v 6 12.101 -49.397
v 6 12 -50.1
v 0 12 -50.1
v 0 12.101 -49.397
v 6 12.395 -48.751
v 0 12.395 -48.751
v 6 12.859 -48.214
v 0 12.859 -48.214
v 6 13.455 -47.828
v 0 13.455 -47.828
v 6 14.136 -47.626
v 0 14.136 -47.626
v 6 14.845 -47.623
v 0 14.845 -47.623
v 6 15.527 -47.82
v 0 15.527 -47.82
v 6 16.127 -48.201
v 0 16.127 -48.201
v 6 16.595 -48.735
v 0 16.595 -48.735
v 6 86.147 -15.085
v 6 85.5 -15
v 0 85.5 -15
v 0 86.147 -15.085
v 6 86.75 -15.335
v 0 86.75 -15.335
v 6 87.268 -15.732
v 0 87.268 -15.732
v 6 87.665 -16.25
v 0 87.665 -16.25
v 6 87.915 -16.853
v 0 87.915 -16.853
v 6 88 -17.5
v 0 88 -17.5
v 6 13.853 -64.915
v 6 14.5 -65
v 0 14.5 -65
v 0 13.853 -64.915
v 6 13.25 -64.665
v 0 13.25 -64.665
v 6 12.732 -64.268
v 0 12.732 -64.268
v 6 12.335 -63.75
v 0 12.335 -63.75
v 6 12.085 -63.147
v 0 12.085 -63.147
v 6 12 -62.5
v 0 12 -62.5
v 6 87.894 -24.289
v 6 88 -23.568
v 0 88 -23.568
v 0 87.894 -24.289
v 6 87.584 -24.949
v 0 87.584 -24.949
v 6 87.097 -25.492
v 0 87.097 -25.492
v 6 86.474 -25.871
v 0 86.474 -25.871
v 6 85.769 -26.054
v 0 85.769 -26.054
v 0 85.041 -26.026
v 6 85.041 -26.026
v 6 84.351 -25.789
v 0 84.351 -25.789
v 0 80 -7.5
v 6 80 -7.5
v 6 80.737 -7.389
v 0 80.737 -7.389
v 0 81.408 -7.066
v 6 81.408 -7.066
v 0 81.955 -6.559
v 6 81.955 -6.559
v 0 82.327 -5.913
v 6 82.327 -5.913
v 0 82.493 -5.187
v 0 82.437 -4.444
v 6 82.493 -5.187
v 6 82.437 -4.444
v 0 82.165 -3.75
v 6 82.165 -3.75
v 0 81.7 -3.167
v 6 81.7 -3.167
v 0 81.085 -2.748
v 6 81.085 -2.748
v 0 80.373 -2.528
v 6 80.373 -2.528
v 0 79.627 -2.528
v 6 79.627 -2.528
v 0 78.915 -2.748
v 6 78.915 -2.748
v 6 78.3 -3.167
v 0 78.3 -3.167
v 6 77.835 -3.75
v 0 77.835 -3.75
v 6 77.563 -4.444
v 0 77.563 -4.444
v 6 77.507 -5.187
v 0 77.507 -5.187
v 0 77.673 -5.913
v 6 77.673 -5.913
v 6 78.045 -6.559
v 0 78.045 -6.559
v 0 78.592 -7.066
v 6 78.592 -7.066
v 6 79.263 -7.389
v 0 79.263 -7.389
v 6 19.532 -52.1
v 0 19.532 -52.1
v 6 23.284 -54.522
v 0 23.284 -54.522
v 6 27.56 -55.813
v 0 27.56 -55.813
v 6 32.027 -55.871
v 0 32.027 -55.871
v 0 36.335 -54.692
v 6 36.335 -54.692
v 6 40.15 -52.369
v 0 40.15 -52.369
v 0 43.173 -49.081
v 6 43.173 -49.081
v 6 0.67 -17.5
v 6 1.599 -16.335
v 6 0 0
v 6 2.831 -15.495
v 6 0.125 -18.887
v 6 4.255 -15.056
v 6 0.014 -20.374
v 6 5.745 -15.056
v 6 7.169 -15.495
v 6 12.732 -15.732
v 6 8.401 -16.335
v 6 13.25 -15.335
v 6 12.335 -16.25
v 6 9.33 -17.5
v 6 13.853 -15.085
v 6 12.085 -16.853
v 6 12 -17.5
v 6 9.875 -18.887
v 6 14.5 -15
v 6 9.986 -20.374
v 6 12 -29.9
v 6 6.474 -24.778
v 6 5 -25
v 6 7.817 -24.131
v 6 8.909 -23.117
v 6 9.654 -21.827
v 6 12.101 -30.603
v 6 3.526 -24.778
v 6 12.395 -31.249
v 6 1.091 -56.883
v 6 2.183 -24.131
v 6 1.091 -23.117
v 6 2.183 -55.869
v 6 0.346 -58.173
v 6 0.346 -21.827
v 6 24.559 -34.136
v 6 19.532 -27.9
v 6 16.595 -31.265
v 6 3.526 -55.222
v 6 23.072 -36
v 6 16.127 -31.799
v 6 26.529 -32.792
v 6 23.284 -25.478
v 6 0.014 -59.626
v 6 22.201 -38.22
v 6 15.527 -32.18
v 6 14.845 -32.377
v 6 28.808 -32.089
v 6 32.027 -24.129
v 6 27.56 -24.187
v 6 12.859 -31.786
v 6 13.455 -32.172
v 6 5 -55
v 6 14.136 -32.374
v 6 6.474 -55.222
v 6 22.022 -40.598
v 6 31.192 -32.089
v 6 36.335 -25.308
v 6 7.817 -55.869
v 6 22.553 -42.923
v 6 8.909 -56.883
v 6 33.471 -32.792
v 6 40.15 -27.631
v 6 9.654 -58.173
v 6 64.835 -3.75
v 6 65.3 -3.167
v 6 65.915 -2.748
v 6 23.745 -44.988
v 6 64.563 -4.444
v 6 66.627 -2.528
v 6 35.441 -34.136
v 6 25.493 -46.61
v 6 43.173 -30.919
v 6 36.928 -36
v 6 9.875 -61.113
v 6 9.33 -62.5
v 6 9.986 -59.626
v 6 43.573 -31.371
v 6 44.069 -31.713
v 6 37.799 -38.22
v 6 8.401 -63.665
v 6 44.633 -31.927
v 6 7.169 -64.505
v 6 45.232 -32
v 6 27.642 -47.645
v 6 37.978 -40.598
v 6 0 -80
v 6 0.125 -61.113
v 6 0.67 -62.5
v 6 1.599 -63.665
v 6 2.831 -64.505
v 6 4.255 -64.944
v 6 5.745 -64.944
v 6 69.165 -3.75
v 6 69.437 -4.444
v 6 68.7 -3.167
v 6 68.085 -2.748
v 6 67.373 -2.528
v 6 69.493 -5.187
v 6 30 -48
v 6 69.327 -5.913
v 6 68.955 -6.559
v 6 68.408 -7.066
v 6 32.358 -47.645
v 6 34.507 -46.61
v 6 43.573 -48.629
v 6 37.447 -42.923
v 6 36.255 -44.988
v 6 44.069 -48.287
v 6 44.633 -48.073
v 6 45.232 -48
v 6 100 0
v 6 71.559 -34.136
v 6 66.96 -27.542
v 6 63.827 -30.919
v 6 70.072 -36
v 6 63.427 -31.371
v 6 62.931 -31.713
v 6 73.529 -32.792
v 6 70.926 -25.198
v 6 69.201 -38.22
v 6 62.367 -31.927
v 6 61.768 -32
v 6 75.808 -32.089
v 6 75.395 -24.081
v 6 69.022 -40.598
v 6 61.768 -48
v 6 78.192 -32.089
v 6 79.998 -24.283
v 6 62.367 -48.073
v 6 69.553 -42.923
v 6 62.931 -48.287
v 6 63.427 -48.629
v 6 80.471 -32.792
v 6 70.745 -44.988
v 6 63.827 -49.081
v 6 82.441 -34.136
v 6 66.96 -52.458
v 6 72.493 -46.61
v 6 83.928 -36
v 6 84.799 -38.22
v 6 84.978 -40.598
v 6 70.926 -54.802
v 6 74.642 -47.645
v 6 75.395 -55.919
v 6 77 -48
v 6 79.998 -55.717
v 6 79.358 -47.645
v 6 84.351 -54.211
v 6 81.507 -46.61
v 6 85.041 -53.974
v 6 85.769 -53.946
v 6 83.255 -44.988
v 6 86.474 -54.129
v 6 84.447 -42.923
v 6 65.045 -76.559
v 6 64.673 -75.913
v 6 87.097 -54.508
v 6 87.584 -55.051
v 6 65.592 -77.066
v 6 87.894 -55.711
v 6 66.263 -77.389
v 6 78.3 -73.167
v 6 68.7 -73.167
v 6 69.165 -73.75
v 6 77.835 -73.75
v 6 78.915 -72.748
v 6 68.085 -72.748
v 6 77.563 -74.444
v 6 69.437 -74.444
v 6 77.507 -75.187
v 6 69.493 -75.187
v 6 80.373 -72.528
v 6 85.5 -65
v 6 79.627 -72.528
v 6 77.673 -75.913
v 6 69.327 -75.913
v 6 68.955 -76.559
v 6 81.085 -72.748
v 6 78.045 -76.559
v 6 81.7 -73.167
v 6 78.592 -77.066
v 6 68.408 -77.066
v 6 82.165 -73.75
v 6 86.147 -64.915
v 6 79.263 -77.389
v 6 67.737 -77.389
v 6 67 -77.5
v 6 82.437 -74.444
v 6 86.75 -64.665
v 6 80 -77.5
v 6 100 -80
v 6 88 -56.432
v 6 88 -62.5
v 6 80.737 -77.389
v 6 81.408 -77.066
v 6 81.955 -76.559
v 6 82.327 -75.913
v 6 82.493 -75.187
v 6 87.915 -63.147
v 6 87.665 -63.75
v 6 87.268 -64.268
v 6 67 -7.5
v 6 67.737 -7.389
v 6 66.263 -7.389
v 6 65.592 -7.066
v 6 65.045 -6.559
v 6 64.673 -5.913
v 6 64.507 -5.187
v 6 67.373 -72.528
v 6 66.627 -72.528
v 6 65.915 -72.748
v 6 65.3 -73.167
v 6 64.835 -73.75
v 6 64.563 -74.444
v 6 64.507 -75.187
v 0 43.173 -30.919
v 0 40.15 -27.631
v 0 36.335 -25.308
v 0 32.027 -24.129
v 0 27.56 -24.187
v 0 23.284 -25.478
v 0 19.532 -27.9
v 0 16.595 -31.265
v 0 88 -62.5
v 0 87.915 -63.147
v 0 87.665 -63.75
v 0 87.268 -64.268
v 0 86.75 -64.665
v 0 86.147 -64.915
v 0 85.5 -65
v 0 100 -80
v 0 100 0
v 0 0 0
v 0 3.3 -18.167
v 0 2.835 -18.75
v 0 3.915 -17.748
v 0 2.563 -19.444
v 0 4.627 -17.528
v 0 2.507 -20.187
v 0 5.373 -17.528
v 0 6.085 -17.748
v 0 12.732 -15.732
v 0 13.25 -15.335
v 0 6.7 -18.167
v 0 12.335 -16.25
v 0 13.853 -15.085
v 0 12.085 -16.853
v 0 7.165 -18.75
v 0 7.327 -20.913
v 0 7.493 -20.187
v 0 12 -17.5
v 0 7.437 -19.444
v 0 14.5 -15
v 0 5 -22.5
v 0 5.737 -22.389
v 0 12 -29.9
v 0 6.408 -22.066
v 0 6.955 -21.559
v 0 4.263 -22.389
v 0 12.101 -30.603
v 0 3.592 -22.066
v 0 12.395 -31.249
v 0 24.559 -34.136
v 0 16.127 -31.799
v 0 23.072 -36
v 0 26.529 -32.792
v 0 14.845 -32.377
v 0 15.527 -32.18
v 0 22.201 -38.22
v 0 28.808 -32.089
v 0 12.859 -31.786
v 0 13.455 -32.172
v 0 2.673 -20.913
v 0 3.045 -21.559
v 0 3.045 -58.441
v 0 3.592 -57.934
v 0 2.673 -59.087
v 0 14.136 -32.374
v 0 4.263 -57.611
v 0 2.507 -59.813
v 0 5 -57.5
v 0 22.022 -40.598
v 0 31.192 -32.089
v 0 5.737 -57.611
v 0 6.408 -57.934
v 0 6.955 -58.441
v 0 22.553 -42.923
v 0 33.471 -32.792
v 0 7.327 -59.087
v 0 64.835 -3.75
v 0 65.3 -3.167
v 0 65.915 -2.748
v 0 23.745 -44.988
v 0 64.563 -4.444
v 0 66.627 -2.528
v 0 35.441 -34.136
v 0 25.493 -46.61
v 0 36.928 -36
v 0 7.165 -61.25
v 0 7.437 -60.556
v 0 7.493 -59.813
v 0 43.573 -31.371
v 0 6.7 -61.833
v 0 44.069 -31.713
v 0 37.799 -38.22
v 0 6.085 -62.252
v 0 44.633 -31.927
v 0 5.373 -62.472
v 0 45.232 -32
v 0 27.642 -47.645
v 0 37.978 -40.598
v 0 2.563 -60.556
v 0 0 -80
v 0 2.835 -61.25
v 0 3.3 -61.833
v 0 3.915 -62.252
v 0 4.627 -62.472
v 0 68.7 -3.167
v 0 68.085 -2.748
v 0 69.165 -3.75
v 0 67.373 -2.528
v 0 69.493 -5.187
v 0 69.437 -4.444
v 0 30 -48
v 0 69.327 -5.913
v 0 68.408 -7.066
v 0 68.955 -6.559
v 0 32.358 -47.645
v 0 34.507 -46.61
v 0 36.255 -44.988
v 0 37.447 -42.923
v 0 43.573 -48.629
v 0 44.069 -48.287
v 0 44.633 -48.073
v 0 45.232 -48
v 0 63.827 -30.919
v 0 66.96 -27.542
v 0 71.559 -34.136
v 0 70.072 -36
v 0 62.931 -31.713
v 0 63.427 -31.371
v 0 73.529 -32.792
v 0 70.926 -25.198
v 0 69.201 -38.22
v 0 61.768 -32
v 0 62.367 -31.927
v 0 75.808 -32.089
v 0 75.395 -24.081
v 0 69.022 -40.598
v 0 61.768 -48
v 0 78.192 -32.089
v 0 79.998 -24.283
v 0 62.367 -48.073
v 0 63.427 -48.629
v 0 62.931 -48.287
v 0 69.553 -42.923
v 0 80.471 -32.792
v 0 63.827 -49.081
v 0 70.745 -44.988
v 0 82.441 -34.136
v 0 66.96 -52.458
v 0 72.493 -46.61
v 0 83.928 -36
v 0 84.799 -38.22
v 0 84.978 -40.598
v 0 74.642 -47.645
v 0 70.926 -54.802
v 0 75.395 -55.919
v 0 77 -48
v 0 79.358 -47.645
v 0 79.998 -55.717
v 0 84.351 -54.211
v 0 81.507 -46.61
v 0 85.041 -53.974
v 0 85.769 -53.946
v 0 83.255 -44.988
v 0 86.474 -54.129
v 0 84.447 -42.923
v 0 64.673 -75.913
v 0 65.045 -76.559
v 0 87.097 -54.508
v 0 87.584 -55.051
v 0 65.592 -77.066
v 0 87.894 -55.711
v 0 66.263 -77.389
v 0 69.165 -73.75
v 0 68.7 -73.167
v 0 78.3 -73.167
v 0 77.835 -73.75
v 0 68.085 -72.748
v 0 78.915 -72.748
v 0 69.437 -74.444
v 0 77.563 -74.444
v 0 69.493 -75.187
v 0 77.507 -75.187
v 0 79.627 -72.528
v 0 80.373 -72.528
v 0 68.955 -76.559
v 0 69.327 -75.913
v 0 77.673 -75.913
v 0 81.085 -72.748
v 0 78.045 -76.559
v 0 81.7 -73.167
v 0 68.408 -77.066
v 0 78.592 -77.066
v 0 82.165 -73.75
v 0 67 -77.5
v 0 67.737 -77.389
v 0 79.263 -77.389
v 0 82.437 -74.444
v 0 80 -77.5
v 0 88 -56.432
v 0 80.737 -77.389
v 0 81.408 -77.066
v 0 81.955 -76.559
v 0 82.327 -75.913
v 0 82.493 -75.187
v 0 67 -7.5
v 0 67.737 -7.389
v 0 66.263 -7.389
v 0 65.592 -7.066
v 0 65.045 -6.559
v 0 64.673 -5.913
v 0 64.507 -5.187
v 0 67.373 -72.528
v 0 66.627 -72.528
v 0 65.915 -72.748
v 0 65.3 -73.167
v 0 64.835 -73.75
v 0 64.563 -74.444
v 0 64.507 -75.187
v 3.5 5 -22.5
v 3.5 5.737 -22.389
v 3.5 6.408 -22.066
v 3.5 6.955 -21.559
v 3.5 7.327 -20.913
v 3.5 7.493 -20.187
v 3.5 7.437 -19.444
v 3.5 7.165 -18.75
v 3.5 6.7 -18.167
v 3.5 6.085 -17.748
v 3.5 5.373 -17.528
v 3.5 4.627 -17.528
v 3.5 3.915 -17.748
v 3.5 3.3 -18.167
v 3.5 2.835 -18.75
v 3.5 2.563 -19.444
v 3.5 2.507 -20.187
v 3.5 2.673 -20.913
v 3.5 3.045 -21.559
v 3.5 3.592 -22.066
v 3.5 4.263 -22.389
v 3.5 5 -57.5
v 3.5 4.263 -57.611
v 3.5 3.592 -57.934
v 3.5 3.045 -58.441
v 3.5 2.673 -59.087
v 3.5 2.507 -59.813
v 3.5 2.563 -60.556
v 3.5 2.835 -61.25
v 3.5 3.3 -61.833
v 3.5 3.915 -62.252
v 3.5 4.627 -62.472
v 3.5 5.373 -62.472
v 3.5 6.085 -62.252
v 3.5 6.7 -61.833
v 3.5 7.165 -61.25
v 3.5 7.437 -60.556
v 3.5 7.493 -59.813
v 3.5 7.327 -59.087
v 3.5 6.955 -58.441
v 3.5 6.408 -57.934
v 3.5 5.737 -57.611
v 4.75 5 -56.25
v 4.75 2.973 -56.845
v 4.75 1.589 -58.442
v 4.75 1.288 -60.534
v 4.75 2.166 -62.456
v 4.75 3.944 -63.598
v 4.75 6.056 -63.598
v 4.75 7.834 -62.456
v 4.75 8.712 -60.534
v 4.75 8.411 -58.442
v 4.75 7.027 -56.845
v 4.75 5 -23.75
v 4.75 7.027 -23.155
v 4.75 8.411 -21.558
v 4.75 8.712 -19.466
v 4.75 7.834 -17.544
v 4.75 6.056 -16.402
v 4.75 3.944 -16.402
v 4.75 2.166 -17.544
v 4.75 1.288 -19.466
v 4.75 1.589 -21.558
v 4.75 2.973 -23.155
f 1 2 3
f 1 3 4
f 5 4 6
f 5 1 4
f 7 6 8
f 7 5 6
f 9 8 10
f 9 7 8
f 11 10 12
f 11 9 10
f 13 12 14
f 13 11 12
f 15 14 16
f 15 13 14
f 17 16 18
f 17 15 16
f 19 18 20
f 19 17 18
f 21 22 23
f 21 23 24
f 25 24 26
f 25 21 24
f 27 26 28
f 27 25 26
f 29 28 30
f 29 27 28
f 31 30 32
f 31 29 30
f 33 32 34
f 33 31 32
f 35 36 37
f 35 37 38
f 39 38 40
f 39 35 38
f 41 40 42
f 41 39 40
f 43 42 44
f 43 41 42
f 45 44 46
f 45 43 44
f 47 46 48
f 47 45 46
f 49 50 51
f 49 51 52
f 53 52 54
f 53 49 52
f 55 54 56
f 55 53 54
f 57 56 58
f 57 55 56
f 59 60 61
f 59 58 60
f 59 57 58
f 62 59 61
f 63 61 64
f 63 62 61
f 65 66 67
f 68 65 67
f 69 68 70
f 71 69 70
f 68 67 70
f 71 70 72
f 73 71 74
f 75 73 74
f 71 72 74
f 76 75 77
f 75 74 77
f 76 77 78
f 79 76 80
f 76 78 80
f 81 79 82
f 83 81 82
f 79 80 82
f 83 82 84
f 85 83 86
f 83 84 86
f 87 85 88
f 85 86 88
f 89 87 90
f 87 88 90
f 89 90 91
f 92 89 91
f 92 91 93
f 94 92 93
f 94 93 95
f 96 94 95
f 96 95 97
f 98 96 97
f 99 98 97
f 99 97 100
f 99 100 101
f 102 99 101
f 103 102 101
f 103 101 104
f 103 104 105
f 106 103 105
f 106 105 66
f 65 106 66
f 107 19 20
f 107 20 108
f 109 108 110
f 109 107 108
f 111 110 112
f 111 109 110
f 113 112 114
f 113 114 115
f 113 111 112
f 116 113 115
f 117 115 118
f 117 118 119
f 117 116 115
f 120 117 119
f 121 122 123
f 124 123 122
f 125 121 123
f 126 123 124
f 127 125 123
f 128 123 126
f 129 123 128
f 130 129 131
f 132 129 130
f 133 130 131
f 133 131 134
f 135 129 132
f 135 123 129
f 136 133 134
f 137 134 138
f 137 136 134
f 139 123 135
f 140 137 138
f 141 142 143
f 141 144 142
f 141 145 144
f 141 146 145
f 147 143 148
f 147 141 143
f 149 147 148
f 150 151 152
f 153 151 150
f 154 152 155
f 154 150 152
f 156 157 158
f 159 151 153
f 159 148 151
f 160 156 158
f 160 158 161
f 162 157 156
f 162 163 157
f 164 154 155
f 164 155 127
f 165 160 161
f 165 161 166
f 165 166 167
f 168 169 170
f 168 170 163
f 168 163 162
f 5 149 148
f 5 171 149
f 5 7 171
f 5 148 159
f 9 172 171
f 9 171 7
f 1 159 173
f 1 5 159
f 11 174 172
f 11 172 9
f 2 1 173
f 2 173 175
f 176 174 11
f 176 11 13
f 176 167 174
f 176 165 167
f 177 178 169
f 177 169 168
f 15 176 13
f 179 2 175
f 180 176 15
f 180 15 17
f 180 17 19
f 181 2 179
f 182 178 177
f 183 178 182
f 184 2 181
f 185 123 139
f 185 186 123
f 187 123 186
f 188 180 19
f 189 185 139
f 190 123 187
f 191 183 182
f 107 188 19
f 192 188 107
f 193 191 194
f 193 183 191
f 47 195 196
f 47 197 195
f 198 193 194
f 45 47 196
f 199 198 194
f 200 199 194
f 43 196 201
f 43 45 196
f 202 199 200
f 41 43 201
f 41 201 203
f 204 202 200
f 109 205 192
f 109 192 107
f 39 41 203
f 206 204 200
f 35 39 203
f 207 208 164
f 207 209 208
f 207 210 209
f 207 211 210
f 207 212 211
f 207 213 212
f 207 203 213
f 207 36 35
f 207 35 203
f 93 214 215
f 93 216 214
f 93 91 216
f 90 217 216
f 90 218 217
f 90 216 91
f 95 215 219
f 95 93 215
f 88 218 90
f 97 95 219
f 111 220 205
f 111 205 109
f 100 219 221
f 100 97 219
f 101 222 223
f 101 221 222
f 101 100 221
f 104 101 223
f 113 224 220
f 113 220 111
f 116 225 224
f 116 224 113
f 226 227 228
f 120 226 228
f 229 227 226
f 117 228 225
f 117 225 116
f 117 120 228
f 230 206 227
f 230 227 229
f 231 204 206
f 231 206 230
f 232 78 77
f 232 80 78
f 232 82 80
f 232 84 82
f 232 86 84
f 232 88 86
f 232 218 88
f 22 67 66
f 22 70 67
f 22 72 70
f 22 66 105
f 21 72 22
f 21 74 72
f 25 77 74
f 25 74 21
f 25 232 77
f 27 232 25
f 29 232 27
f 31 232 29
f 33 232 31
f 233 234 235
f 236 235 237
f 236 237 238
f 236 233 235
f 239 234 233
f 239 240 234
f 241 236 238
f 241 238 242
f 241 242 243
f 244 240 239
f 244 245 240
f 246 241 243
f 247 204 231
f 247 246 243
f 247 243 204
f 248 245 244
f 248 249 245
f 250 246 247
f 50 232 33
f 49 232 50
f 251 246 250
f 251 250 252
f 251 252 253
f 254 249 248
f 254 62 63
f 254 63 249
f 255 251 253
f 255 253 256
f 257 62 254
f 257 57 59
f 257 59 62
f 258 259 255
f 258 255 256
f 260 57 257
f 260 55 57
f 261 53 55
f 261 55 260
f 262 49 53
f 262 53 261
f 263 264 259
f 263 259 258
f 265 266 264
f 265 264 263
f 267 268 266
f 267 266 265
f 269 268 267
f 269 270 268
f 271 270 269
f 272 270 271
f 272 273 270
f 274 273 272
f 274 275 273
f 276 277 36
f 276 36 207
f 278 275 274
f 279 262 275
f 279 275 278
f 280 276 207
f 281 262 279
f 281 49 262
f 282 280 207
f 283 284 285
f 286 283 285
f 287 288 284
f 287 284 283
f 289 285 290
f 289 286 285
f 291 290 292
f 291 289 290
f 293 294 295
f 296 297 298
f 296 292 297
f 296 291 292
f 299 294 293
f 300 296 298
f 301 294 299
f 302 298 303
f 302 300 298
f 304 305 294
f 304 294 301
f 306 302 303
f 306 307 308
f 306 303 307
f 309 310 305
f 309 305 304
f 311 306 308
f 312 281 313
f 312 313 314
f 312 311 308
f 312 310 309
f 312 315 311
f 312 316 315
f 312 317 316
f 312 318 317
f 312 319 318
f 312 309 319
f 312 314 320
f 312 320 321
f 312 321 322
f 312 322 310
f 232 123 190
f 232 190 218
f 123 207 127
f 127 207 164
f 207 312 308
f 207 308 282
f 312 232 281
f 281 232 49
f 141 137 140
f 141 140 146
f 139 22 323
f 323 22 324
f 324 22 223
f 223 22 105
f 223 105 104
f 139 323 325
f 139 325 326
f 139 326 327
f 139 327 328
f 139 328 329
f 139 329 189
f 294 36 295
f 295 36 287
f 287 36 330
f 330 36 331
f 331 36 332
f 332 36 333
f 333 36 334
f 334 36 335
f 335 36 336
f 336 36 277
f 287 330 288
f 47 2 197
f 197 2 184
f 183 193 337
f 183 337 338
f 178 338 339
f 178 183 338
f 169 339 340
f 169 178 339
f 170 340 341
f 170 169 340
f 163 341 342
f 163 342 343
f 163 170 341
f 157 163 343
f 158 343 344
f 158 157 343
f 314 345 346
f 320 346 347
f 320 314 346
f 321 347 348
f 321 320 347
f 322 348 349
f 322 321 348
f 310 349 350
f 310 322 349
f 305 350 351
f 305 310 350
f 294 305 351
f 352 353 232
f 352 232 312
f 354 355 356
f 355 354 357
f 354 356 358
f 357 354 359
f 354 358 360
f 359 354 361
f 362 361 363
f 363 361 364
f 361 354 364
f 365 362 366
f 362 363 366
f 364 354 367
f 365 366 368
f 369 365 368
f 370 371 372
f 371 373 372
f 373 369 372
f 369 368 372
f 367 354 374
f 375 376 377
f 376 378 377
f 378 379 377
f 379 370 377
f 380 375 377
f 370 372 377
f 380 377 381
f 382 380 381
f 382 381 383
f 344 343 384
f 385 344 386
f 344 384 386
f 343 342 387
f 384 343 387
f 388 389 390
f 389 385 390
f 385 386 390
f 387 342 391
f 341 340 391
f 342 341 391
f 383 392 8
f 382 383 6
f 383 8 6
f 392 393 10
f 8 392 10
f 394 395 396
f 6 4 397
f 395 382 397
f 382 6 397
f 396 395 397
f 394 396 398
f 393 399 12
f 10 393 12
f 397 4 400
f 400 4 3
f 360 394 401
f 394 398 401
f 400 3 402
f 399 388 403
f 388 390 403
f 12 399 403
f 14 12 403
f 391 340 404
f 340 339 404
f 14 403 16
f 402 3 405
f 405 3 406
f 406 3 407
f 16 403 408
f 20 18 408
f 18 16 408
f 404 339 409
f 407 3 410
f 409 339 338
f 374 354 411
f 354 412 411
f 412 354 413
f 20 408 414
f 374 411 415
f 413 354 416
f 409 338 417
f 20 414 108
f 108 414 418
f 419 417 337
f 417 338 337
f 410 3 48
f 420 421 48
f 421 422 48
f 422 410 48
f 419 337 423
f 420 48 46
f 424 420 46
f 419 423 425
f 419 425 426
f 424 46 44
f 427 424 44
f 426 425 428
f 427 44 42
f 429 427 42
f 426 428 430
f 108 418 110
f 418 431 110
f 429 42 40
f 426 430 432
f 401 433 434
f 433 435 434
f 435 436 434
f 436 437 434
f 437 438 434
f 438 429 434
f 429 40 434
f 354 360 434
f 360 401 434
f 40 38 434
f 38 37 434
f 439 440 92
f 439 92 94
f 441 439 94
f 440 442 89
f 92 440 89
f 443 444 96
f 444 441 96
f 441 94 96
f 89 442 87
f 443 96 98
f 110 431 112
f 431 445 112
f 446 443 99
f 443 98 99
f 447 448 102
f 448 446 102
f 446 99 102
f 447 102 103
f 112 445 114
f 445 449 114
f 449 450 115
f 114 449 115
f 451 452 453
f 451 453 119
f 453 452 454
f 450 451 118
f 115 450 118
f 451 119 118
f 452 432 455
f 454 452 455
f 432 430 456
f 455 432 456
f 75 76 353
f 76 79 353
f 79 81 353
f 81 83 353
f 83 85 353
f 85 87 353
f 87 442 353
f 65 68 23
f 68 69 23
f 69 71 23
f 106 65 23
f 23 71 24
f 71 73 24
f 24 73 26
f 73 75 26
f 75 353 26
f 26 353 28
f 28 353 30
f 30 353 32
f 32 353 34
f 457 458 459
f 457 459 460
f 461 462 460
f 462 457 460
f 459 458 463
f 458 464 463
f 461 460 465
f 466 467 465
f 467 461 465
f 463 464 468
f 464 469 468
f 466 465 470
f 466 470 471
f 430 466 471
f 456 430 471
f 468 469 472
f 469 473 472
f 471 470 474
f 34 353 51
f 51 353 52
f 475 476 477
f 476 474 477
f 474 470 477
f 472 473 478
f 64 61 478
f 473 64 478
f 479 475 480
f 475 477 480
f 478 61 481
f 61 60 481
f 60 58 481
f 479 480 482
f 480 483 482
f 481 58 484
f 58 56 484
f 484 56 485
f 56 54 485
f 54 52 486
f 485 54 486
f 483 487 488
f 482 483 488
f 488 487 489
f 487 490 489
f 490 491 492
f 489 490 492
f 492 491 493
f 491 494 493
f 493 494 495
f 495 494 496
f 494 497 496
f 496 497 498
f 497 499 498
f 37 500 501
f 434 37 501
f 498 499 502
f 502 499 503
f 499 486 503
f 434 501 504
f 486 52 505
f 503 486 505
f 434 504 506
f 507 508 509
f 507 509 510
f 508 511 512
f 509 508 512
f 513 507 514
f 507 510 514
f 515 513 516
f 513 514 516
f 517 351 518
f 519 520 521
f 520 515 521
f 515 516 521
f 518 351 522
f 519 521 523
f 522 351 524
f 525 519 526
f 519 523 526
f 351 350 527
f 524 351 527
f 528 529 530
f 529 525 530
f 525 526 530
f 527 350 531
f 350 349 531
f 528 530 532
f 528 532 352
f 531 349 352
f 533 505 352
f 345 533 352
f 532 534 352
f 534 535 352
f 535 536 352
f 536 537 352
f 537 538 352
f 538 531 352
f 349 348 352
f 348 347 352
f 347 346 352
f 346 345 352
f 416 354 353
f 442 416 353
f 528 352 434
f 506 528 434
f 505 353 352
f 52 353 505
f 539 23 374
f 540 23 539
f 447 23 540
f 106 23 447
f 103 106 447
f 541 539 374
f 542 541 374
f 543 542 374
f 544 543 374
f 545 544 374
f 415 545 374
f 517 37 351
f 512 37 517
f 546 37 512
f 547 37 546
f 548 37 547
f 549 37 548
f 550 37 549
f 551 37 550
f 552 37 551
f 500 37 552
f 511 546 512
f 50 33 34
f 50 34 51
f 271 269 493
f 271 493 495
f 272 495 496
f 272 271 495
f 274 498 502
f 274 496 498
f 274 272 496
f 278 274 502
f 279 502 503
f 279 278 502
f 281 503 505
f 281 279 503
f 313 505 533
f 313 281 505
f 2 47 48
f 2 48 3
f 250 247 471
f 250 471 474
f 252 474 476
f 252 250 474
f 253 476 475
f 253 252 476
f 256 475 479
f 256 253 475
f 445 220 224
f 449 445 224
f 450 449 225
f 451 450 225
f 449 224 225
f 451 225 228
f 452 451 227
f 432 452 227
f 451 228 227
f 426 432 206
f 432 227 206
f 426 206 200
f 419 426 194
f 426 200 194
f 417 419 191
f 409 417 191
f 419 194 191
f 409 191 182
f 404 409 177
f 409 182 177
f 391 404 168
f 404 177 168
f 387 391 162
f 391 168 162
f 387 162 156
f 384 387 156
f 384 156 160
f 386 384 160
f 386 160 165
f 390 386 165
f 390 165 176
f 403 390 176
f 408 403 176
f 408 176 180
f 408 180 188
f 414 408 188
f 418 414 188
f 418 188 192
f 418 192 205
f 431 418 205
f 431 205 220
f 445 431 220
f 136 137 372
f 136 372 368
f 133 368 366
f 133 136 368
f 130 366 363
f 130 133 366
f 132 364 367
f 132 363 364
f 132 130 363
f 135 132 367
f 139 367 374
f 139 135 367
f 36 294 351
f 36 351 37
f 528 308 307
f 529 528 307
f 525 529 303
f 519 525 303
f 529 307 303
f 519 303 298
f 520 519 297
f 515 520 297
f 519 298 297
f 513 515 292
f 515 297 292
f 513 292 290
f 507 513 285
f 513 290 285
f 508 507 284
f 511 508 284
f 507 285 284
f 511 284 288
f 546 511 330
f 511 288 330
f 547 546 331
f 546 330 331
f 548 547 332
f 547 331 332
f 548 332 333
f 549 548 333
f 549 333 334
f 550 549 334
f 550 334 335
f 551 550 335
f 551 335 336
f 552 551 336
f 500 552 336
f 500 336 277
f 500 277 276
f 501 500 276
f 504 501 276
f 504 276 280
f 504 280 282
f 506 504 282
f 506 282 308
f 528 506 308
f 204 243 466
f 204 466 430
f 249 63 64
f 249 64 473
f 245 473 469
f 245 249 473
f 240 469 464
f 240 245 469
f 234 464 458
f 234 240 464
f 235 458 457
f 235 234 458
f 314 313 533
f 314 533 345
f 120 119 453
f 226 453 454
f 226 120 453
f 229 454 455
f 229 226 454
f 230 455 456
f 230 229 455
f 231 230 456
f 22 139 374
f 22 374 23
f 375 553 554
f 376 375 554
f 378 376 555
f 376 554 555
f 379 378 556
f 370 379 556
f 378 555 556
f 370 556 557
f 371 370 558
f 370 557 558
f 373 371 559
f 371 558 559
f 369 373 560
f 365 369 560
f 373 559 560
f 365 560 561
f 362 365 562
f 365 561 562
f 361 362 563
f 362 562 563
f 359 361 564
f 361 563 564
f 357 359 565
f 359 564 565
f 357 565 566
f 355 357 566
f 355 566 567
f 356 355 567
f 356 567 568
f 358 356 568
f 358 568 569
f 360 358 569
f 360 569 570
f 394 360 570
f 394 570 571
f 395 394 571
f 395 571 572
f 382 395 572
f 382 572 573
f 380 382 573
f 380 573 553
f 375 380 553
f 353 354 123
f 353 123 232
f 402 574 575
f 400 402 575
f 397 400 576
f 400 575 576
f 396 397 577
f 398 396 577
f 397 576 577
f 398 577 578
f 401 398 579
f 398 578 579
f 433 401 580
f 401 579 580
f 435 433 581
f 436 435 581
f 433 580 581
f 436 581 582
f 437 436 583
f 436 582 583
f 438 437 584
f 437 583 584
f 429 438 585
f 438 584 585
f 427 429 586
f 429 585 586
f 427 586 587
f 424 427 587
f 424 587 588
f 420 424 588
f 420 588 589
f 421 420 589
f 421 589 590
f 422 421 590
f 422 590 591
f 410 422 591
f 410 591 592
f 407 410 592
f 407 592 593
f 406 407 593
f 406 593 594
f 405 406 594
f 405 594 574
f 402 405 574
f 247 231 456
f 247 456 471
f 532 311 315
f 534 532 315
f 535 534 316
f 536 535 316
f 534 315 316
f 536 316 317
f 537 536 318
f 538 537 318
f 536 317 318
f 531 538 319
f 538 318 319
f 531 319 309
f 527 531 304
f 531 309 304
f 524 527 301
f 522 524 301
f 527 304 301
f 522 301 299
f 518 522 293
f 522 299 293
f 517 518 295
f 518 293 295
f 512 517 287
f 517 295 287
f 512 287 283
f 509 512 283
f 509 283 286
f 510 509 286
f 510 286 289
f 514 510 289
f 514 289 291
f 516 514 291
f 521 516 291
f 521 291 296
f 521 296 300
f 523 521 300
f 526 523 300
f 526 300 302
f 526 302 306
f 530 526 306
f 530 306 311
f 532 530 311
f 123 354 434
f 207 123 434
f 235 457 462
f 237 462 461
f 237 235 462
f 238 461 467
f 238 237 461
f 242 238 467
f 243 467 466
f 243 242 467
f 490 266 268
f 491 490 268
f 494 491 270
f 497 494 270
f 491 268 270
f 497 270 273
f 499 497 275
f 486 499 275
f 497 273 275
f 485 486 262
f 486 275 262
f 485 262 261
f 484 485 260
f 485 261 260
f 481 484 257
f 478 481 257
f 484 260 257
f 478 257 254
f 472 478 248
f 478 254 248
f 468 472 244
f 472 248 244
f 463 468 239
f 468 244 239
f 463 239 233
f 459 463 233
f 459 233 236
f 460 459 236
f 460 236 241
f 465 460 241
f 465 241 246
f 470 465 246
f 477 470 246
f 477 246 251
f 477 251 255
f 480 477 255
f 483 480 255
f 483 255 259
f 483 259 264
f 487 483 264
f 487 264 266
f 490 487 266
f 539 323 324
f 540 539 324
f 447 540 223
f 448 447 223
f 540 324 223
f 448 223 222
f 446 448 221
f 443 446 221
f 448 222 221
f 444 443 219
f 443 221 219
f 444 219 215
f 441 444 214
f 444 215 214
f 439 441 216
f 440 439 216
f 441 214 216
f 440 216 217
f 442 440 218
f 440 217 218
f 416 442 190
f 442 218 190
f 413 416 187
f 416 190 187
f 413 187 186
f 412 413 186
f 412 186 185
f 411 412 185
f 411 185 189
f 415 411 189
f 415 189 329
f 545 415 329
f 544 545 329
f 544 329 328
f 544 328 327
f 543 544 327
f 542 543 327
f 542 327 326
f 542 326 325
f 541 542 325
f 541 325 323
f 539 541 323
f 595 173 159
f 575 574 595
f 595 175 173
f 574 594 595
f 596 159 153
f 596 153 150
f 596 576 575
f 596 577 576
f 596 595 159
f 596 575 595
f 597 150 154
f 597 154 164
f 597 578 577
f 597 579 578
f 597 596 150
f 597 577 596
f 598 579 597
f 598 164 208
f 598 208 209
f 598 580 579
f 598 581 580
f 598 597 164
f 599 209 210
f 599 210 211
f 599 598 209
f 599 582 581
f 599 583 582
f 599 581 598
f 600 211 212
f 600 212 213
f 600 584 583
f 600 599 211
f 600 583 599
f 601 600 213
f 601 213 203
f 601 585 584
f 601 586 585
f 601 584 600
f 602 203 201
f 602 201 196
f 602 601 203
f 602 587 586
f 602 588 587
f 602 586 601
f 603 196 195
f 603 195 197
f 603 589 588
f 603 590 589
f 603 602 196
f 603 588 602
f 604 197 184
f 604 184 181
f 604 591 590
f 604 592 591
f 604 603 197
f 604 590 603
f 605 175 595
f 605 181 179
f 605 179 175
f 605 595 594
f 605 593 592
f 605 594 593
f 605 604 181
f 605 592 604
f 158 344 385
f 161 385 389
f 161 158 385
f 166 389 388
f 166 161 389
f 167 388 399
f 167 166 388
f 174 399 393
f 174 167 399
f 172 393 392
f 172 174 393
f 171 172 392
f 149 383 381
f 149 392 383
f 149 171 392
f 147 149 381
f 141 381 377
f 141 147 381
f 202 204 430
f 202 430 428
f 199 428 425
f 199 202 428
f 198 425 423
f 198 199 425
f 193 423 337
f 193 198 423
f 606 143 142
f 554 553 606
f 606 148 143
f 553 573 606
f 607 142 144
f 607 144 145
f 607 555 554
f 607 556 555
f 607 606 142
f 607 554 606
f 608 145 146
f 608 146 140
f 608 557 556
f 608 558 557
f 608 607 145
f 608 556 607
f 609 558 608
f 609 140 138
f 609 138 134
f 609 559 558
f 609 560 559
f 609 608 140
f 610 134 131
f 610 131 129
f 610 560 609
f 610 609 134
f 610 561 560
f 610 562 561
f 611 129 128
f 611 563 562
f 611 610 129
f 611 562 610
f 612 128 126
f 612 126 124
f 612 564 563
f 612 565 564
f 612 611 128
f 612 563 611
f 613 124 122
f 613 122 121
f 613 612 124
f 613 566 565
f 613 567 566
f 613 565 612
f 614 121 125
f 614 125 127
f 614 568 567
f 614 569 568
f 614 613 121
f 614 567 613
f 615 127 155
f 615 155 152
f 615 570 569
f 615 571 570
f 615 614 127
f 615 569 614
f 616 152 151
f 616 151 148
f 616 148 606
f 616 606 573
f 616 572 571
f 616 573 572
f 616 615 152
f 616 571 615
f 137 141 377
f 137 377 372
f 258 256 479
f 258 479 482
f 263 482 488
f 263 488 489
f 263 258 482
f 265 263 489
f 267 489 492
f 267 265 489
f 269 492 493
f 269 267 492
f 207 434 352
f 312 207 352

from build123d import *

# Parameters (mm, degrees)
ESQUISSE1_W      = 80
ESQUISSE1_H      = 100.00000000000001
EXTRUSION1_DEPTH = 6
ESQUISSE2_R      = 8
ESQUISSE2_R_2    = 7.999999999999998
ESQUISSE2_R_3    = 2.5000000000000018
ESQUISSE2_R_4    = 2.4999999999999956
ESQUISSE2_R_5    = 2.4999999999999982
ESQUISSE2_R_6    = 2.499999999999995
EXTRUSION3_DEPTH = 129.20296408429877
CHANFREIN1_SIZE  = 2.5


with BuildPart() as part:
    # Esquisse1 → Extrusion1 (new body)
    with BuildSketch(Plane(origin=(0, 0, 0), x_dir=(0, 0, -1), z_dir=(1, 0, 0))):
        with Locations((40, 50.00000000000001)):
            Rectangle(ESQUISSE1_W, ESQUISSE1_H)
    extrude(amount=EXTRUSION1_DEPTH)

    # Esquisse2 → Extrusion3 (cut, through all)
    with BuildSketch(Plane(origin=(6, 0, 0), x_dir=(0, 0, -1), z_dir=(1, 0, 0))):
        with Locations((40, 77.00000000000001)):
            Circle(ESQUISSE2_R)
        with Locations((40, 30)):
            Circle(ESQUISSE2_R_2)
        with Locations((5, 80)):
            Circle(ESQUISSE2_R_3)
        with Locations((75.00000000000001, 80)):
            Circle(ESQUISSE2_R_4)
        with Locations((5.000000000000136, 67)):
            Circle(ESQUISSE2_R_3)
        with Locations((75.00000000000016, 67)):
            Circle(ESQUISSE2_R_4)
        with Locations((20, 5.000000000000004)):
            Circle(ESQUISSE2_R_5)
        with Locations(Location((60.00000000000098, 5.000000000000004, 0), (0, 0, 180))):
            Circle(ESQUISSE2_R_6)
        with BuildLine():
            Line((17.499999999999996, 88.00000000000001), (23.568323274845017, 88.00000000000001))
            ThreePointArc((23.568323274845017, 88.00000000000001), (25.703928765288133, 86.79968811227509), (25.788820129595685, 84.35135135135135))
            ThreePointArc((25.788820129595685, 84.35135135135135), (24.477533819987812, 73.12017478610468), (30.918918918918916, 63.8267708439111))
            ThreePointArc((30.918918918918916, 63.8267708439111), (31.713289101913404, 62.930930175710394), (32, 61.7684537882722))
            Line((32, 61.7684537882722), (32, 45.231546211727824))
            ThreePointArc((32, 45.231546211727824), (31.713289101913414, 44.069069824289635), (30.918918918918926, 43.17322915608893))
            ThreePointArc((30.918918918918926, 43.17322915608893), (24.001358501680507, 29.79150489634176), (31.265293026281448, 16.594594594594593))
            ThreePointArc((31.265293026281448, 16.594594594594593), (32.297001527984975, 13.788131503185623), (29.900495061637923, 12))
            Line((29.900495061637923, 12), (17.500000000000007, 12))
            ThreePointArc((17.500000000000007, 12), (15.73223304703364, 12.732233047033631), (15.00000000000001, 14.499999999999998))
            Line((15.00000000000001, 14.499999999999998), (15.000000000000002, 85.5))
            ThreePointArc((15.000000000000002, 85.5), (15.732233047033617, 87.26776695296638), (17.499999999999996, 88.00000000000001))
        make_face()
        with BuildLine():
            Line((65, 85.5), (65.00000000000001, 14.5))
            ThreePointArc((65.00000000000001, 14.5), (64.26776695296637, 12.732233047033631), (62.5, 12))
            Line((62.5, 12), (50.09950493836208, 12))
            ThreePointArc((50.09950493836208, 12), (47.702998472015025, 13.78813150318562), (48.73470697371855, 16.594594594594593))
            ThreePointArc((48.73470697371855, 16.594594594594593), (55.99864149831949, 29.79150489634175), (49.08108108108109, 43.17322915608893))
            ThreePointArc((49.08108108108109, 43.17322915608893), (48.286710898086596, 44.06906982428963), (48, 45.23154621172782))
            Line((48, 45.23154621172782), (48, 61.7684537882722))
            ThreePointArc((48, 61.7684537882722), (48.286710898086596, 62.930930175710394), (49.08108108108109, 63.8267708439111))
            ThreePointArc((49.08108108108109, 63.8267708439111), (55.52246618001219, 73.1201747861047), (54.2111798704043, 84.35135135135137))
            ThreePointArc((54.2111798704043, 84.35135135135137), (54.29607123471186, 86.7996881122751), (56.43167672515498, 88.00000000000001))
            Line((56.43167672515498, 88.00000000000001), (62.5, 88.00000000000001))
            ThreePointArc((62.5, 88.00000000000001), (64.26776695296637, 87.26776695296637), (65, 85.5))
        make_face()
    extrude(amount=-EXTRUSION3_DEPTH, mode=Mode.SUBTRACT)

    # Chanfrein1
    chanfrein1_edges = [part.edges().sort_by_distance(p)[0] for p in [
        (6, 5.000000000000004, -17.5),
        (6, 5.0000000000000036, -62.50000000000097),
    ]]
    chamfer(chanfrein1_edges, length=CHANFREIN1_SIZE)


solid = part.part
